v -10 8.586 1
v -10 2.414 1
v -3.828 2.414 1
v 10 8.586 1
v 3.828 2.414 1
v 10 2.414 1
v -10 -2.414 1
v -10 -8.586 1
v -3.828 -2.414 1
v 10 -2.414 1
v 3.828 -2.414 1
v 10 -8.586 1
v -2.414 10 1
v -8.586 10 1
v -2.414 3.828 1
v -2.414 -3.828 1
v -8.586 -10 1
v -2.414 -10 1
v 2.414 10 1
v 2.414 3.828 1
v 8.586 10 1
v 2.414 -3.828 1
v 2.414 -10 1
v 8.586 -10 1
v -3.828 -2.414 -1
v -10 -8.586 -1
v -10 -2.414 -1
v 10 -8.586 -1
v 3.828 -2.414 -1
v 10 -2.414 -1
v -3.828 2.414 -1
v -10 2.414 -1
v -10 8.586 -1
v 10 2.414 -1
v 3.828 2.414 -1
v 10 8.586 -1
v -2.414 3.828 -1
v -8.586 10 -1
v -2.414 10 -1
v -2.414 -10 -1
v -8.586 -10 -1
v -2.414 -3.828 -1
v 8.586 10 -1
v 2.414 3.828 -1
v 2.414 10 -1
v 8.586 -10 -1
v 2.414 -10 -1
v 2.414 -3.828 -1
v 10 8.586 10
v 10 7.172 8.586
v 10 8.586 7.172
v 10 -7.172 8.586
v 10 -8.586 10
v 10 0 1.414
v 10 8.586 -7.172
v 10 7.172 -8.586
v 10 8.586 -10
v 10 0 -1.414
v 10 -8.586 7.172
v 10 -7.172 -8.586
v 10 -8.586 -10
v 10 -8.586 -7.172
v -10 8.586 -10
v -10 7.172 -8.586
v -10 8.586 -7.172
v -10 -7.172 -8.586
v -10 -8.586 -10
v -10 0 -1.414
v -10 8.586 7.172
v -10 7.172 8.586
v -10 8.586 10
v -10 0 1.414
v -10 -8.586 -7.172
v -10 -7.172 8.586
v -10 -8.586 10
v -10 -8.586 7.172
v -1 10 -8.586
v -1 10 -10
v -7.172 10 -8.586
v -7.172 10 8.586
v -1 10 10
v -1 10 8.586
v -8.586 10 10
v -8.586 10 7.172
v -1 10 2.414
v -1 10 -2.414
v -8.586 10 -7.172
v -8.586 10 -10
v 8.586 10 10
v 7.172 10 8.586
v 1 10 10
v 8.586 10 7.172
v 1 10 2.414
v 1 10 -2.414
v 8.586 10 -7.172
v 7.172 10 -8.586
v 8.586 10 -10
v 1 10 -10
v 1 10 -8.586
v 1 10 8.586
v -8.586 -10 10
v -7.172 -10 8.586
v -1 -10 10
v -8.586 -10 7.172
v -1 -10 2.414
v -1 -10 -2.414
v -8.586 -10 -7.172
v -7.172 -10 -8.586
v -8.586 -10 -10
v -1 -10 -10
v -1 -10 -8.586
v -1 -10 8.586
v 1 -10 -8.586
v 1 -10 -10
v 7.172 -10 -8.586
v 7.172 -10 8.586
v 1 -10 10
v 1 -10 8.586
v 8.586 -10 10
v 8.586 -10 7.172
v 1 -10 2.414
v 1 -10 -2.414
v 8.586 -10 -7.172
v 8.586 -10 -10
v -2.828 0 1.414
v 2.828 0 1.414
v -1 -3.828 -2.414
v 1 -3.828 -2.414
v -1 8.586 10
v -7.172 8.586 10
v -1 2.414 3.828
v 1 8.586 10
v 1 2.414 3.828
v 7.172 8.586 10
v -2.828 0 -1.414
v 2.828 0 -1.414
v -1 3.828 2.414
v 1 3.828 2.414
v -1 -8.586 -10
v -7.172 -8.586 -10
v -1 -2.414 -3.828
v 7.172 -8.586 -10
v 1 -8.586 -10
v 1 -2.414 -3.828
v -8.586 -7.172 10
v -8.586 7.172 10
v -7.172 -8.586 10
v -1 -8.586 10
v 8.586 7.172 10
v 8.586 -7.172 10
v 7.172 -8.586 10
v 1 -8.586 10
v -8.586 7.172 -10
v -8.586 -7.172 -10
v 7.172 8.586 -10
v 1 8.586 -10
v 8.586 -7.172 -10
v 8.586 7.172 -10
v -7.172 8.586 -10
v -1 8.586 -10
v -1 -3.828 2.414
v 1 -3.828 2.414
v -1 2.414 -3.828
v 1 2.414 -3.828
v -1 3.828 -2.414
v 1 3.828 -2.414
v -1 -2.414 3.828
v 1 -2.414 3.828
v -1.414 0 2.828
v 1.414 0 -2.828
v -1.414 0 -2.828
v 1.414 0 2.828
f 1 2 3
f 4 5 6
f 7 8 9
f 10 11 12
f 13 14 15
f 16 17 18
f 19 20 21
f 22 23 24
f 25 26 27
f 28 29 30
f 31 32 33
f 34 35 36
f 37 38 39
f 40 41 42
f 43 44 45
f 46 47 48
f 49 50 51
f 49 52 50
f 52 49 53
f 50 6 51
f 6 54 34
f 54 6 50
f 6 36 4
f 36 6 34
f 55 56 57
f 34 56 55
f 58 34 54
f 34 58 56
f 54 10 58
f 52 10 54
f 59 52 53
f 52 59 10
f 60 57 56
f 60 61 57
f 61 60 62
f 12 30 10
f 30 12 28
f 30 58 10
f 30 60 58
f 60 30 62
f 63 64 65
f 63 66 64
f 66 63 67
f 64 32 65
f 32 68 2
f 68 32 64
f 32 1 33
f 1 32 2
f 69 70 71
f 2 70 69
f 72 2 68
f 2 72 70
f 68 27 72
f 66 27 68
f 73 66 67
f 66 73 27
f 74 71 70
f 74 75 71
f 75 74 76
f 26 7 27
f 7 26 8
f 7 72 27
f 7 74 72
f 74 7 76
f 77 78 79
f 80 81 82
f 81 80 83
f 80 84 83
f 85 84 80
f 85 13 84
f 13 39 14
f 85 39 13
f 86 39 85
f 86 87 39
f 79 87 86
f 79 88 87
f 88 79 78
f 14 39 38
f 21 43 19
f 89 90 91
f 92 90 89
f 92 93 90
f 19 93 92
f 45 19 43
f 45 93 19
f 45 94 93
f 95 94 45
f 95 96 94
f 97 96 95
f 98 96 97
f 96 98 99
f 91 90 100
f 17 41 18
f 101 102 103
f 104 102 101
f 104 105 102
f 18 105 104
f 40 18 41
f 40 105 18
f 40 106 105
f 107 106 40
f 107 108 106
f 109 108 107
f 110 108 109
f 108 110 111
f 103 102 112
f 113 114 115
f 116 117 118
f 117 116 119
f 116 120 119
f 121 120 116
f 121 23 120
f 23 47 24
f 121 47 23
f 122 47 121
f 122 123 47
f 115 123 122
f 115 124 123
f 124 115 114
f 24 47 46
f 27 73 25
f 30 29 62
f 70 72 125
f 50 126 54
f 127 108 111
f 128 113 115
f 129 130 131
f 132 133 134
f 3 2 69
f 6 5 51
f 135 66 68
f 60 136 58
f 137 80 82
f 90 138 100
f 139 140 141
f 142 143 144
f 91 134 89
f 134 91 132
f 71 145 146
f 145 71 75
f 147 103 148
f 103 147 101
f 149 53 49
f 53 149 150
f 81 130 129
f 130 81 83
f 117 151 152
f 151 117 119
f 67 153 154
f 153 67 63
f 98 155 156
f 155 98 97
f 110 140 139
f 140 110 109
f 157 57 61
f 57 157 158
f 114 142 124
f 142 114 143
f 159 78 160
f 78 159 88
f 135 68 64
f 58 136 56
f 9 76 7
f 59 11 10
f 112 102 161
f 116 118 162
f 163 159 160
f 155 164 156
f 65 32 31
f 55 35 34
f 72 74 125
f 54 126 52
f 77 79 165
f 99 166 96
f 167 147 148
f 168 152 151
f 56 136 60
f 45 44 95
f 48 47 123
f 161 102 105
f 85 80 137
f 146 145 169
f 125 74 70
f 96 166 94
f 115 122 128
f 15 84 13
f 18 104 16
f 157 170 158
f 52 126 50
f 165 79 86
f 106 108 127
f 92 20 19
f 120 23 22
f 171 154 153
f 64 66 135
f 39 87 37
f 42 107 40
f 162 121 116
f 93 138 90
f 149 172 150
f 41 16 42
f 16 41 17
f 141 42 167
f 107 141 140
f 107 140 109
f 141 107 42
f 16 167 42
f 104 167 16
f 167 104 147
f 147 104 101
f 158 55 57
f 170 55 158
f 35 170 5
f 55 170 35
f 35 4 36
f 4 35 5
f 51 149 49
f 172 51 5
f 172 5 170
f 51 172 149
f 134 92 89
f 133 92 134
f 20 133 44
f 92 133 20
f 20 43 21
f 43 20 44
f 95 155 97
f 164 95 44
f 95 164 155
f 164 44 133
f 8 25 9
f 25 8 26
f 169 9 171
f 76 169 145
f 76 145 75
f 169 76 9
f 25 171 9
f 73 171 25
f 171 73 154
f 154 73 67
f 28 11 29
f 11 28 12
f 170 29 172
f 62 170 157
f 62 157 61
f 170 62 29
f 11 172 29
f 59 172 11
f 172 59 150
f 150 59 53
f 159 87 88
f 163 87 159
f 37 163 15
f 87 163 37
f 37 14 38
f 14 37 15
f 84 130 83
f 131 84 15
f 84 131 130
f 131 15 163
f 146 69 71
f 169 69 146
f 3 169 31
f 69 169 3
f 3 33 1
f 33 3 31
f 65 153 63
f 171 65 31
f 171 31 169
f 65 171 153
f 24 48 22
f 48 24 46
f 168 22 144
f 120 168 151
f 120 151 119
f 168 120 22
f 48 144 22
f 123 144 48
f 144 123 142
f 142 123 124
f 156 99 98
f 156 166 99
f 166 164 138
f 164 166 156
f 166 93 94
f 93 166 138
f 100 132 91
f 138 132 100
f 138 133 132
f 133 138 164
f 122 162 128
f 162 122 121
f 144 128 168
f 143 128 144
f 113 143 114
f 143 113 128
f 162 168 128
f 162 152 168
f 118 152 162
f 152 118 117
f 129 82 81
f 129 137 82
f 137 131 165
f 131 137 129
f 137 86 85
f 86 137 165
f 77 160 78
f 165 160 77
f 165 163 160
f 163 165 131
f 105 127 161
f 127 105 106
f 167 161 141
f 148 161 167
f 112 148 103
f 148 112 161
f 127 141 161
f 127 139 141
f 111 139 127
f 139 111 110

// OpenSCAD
cube_size=20; //Cube Dimensions in mm
plate_size=2; //Plate Thickness in mm
whole=3;
frag="YES";

module plate(XRotate,YRotate,cube_size,plate_width){
    intersection(){
        rotate([XRotate,YRotate,0]) cube([(2.5*cube_size),(2.5*cube_size),plate_width],center=true);
        cube(cube_size,center=true);
    }
}
if(frag=="YES"){
z=8-whole; 
difference(){
    union(){
    for(k=[1:z]){
        if(k==9) plate(45,90,cube_size,plate_size);
        if(k==8) rotate([0,0,90]) plate(45,90,cube_size,plate_size);
        if(k==7) plate(0,90,cube_size,plate_size);
        if(k==6) plate(90,90,cube_size,plate_size);
        if(k==5) plate(0,45,cube_size, plate_size);
        if(k==4) rotate([0,90,0]) plate(0,45,cube_size, plate_size);
        if(k==3) plate(45,0,cube_size,plate_size);
        if(k==2) rotate([90,0,0]) plate(45,0,cube_size,plate_size);
        if(k==1) plate(0,0,cube_size,plate_size);
        }
    }
    union(){
    for (x=[1:whole]){
        if(x==1) plate(45,90,cube_size,plate_size);
        if(x==2) rotate([0,0,90]) plate(45,90,cube_size,plate_size);
        if(x==3) plate(0,90,cube_size,plate_size);
        if(x==4) plate(90,90,cube_size,plate_size);
        if(x==5) plate(0,45,cube_size, plate_size);
        if(x==6) rotate([0,90,0]) plate(0,45,cube_size, plate_size);
        if(x==7) plate(45,0,cube_size,plate_size);
        if(x==8) rotate([90,0,0]) plate(45,0,cube_size,plate_size);
        if(x==9) plate(0,0,cube_size,plate_size);
        }
    }
}
}
else if(frag=="NO"){
    for (x=[1:whole]){
        if(x==1) plate(45,90,cube_size,plate_size);
        if(x==2) rotate([0,0,90]) plate(45,90,cube_size,plate_size);
        if(x==3) plate(0,90,cube_size,plate_size);
        if(x==4) plate(90,90,cube_size,plate_size);
        if(x==5) plate(0,45,cube_size, plate_size);
        if(x==6) rotate([0,90,0]) plate(0,45,cube_size, plate_size);
        if(x==7) plate(45,0,cube_size,plate_size);
        if(x==8) rotate([90,0,0]) plate(45,0,cube_size,plate_size);
        if(x==9) plate(0,0,cube_size,plate_size);
    }
}
